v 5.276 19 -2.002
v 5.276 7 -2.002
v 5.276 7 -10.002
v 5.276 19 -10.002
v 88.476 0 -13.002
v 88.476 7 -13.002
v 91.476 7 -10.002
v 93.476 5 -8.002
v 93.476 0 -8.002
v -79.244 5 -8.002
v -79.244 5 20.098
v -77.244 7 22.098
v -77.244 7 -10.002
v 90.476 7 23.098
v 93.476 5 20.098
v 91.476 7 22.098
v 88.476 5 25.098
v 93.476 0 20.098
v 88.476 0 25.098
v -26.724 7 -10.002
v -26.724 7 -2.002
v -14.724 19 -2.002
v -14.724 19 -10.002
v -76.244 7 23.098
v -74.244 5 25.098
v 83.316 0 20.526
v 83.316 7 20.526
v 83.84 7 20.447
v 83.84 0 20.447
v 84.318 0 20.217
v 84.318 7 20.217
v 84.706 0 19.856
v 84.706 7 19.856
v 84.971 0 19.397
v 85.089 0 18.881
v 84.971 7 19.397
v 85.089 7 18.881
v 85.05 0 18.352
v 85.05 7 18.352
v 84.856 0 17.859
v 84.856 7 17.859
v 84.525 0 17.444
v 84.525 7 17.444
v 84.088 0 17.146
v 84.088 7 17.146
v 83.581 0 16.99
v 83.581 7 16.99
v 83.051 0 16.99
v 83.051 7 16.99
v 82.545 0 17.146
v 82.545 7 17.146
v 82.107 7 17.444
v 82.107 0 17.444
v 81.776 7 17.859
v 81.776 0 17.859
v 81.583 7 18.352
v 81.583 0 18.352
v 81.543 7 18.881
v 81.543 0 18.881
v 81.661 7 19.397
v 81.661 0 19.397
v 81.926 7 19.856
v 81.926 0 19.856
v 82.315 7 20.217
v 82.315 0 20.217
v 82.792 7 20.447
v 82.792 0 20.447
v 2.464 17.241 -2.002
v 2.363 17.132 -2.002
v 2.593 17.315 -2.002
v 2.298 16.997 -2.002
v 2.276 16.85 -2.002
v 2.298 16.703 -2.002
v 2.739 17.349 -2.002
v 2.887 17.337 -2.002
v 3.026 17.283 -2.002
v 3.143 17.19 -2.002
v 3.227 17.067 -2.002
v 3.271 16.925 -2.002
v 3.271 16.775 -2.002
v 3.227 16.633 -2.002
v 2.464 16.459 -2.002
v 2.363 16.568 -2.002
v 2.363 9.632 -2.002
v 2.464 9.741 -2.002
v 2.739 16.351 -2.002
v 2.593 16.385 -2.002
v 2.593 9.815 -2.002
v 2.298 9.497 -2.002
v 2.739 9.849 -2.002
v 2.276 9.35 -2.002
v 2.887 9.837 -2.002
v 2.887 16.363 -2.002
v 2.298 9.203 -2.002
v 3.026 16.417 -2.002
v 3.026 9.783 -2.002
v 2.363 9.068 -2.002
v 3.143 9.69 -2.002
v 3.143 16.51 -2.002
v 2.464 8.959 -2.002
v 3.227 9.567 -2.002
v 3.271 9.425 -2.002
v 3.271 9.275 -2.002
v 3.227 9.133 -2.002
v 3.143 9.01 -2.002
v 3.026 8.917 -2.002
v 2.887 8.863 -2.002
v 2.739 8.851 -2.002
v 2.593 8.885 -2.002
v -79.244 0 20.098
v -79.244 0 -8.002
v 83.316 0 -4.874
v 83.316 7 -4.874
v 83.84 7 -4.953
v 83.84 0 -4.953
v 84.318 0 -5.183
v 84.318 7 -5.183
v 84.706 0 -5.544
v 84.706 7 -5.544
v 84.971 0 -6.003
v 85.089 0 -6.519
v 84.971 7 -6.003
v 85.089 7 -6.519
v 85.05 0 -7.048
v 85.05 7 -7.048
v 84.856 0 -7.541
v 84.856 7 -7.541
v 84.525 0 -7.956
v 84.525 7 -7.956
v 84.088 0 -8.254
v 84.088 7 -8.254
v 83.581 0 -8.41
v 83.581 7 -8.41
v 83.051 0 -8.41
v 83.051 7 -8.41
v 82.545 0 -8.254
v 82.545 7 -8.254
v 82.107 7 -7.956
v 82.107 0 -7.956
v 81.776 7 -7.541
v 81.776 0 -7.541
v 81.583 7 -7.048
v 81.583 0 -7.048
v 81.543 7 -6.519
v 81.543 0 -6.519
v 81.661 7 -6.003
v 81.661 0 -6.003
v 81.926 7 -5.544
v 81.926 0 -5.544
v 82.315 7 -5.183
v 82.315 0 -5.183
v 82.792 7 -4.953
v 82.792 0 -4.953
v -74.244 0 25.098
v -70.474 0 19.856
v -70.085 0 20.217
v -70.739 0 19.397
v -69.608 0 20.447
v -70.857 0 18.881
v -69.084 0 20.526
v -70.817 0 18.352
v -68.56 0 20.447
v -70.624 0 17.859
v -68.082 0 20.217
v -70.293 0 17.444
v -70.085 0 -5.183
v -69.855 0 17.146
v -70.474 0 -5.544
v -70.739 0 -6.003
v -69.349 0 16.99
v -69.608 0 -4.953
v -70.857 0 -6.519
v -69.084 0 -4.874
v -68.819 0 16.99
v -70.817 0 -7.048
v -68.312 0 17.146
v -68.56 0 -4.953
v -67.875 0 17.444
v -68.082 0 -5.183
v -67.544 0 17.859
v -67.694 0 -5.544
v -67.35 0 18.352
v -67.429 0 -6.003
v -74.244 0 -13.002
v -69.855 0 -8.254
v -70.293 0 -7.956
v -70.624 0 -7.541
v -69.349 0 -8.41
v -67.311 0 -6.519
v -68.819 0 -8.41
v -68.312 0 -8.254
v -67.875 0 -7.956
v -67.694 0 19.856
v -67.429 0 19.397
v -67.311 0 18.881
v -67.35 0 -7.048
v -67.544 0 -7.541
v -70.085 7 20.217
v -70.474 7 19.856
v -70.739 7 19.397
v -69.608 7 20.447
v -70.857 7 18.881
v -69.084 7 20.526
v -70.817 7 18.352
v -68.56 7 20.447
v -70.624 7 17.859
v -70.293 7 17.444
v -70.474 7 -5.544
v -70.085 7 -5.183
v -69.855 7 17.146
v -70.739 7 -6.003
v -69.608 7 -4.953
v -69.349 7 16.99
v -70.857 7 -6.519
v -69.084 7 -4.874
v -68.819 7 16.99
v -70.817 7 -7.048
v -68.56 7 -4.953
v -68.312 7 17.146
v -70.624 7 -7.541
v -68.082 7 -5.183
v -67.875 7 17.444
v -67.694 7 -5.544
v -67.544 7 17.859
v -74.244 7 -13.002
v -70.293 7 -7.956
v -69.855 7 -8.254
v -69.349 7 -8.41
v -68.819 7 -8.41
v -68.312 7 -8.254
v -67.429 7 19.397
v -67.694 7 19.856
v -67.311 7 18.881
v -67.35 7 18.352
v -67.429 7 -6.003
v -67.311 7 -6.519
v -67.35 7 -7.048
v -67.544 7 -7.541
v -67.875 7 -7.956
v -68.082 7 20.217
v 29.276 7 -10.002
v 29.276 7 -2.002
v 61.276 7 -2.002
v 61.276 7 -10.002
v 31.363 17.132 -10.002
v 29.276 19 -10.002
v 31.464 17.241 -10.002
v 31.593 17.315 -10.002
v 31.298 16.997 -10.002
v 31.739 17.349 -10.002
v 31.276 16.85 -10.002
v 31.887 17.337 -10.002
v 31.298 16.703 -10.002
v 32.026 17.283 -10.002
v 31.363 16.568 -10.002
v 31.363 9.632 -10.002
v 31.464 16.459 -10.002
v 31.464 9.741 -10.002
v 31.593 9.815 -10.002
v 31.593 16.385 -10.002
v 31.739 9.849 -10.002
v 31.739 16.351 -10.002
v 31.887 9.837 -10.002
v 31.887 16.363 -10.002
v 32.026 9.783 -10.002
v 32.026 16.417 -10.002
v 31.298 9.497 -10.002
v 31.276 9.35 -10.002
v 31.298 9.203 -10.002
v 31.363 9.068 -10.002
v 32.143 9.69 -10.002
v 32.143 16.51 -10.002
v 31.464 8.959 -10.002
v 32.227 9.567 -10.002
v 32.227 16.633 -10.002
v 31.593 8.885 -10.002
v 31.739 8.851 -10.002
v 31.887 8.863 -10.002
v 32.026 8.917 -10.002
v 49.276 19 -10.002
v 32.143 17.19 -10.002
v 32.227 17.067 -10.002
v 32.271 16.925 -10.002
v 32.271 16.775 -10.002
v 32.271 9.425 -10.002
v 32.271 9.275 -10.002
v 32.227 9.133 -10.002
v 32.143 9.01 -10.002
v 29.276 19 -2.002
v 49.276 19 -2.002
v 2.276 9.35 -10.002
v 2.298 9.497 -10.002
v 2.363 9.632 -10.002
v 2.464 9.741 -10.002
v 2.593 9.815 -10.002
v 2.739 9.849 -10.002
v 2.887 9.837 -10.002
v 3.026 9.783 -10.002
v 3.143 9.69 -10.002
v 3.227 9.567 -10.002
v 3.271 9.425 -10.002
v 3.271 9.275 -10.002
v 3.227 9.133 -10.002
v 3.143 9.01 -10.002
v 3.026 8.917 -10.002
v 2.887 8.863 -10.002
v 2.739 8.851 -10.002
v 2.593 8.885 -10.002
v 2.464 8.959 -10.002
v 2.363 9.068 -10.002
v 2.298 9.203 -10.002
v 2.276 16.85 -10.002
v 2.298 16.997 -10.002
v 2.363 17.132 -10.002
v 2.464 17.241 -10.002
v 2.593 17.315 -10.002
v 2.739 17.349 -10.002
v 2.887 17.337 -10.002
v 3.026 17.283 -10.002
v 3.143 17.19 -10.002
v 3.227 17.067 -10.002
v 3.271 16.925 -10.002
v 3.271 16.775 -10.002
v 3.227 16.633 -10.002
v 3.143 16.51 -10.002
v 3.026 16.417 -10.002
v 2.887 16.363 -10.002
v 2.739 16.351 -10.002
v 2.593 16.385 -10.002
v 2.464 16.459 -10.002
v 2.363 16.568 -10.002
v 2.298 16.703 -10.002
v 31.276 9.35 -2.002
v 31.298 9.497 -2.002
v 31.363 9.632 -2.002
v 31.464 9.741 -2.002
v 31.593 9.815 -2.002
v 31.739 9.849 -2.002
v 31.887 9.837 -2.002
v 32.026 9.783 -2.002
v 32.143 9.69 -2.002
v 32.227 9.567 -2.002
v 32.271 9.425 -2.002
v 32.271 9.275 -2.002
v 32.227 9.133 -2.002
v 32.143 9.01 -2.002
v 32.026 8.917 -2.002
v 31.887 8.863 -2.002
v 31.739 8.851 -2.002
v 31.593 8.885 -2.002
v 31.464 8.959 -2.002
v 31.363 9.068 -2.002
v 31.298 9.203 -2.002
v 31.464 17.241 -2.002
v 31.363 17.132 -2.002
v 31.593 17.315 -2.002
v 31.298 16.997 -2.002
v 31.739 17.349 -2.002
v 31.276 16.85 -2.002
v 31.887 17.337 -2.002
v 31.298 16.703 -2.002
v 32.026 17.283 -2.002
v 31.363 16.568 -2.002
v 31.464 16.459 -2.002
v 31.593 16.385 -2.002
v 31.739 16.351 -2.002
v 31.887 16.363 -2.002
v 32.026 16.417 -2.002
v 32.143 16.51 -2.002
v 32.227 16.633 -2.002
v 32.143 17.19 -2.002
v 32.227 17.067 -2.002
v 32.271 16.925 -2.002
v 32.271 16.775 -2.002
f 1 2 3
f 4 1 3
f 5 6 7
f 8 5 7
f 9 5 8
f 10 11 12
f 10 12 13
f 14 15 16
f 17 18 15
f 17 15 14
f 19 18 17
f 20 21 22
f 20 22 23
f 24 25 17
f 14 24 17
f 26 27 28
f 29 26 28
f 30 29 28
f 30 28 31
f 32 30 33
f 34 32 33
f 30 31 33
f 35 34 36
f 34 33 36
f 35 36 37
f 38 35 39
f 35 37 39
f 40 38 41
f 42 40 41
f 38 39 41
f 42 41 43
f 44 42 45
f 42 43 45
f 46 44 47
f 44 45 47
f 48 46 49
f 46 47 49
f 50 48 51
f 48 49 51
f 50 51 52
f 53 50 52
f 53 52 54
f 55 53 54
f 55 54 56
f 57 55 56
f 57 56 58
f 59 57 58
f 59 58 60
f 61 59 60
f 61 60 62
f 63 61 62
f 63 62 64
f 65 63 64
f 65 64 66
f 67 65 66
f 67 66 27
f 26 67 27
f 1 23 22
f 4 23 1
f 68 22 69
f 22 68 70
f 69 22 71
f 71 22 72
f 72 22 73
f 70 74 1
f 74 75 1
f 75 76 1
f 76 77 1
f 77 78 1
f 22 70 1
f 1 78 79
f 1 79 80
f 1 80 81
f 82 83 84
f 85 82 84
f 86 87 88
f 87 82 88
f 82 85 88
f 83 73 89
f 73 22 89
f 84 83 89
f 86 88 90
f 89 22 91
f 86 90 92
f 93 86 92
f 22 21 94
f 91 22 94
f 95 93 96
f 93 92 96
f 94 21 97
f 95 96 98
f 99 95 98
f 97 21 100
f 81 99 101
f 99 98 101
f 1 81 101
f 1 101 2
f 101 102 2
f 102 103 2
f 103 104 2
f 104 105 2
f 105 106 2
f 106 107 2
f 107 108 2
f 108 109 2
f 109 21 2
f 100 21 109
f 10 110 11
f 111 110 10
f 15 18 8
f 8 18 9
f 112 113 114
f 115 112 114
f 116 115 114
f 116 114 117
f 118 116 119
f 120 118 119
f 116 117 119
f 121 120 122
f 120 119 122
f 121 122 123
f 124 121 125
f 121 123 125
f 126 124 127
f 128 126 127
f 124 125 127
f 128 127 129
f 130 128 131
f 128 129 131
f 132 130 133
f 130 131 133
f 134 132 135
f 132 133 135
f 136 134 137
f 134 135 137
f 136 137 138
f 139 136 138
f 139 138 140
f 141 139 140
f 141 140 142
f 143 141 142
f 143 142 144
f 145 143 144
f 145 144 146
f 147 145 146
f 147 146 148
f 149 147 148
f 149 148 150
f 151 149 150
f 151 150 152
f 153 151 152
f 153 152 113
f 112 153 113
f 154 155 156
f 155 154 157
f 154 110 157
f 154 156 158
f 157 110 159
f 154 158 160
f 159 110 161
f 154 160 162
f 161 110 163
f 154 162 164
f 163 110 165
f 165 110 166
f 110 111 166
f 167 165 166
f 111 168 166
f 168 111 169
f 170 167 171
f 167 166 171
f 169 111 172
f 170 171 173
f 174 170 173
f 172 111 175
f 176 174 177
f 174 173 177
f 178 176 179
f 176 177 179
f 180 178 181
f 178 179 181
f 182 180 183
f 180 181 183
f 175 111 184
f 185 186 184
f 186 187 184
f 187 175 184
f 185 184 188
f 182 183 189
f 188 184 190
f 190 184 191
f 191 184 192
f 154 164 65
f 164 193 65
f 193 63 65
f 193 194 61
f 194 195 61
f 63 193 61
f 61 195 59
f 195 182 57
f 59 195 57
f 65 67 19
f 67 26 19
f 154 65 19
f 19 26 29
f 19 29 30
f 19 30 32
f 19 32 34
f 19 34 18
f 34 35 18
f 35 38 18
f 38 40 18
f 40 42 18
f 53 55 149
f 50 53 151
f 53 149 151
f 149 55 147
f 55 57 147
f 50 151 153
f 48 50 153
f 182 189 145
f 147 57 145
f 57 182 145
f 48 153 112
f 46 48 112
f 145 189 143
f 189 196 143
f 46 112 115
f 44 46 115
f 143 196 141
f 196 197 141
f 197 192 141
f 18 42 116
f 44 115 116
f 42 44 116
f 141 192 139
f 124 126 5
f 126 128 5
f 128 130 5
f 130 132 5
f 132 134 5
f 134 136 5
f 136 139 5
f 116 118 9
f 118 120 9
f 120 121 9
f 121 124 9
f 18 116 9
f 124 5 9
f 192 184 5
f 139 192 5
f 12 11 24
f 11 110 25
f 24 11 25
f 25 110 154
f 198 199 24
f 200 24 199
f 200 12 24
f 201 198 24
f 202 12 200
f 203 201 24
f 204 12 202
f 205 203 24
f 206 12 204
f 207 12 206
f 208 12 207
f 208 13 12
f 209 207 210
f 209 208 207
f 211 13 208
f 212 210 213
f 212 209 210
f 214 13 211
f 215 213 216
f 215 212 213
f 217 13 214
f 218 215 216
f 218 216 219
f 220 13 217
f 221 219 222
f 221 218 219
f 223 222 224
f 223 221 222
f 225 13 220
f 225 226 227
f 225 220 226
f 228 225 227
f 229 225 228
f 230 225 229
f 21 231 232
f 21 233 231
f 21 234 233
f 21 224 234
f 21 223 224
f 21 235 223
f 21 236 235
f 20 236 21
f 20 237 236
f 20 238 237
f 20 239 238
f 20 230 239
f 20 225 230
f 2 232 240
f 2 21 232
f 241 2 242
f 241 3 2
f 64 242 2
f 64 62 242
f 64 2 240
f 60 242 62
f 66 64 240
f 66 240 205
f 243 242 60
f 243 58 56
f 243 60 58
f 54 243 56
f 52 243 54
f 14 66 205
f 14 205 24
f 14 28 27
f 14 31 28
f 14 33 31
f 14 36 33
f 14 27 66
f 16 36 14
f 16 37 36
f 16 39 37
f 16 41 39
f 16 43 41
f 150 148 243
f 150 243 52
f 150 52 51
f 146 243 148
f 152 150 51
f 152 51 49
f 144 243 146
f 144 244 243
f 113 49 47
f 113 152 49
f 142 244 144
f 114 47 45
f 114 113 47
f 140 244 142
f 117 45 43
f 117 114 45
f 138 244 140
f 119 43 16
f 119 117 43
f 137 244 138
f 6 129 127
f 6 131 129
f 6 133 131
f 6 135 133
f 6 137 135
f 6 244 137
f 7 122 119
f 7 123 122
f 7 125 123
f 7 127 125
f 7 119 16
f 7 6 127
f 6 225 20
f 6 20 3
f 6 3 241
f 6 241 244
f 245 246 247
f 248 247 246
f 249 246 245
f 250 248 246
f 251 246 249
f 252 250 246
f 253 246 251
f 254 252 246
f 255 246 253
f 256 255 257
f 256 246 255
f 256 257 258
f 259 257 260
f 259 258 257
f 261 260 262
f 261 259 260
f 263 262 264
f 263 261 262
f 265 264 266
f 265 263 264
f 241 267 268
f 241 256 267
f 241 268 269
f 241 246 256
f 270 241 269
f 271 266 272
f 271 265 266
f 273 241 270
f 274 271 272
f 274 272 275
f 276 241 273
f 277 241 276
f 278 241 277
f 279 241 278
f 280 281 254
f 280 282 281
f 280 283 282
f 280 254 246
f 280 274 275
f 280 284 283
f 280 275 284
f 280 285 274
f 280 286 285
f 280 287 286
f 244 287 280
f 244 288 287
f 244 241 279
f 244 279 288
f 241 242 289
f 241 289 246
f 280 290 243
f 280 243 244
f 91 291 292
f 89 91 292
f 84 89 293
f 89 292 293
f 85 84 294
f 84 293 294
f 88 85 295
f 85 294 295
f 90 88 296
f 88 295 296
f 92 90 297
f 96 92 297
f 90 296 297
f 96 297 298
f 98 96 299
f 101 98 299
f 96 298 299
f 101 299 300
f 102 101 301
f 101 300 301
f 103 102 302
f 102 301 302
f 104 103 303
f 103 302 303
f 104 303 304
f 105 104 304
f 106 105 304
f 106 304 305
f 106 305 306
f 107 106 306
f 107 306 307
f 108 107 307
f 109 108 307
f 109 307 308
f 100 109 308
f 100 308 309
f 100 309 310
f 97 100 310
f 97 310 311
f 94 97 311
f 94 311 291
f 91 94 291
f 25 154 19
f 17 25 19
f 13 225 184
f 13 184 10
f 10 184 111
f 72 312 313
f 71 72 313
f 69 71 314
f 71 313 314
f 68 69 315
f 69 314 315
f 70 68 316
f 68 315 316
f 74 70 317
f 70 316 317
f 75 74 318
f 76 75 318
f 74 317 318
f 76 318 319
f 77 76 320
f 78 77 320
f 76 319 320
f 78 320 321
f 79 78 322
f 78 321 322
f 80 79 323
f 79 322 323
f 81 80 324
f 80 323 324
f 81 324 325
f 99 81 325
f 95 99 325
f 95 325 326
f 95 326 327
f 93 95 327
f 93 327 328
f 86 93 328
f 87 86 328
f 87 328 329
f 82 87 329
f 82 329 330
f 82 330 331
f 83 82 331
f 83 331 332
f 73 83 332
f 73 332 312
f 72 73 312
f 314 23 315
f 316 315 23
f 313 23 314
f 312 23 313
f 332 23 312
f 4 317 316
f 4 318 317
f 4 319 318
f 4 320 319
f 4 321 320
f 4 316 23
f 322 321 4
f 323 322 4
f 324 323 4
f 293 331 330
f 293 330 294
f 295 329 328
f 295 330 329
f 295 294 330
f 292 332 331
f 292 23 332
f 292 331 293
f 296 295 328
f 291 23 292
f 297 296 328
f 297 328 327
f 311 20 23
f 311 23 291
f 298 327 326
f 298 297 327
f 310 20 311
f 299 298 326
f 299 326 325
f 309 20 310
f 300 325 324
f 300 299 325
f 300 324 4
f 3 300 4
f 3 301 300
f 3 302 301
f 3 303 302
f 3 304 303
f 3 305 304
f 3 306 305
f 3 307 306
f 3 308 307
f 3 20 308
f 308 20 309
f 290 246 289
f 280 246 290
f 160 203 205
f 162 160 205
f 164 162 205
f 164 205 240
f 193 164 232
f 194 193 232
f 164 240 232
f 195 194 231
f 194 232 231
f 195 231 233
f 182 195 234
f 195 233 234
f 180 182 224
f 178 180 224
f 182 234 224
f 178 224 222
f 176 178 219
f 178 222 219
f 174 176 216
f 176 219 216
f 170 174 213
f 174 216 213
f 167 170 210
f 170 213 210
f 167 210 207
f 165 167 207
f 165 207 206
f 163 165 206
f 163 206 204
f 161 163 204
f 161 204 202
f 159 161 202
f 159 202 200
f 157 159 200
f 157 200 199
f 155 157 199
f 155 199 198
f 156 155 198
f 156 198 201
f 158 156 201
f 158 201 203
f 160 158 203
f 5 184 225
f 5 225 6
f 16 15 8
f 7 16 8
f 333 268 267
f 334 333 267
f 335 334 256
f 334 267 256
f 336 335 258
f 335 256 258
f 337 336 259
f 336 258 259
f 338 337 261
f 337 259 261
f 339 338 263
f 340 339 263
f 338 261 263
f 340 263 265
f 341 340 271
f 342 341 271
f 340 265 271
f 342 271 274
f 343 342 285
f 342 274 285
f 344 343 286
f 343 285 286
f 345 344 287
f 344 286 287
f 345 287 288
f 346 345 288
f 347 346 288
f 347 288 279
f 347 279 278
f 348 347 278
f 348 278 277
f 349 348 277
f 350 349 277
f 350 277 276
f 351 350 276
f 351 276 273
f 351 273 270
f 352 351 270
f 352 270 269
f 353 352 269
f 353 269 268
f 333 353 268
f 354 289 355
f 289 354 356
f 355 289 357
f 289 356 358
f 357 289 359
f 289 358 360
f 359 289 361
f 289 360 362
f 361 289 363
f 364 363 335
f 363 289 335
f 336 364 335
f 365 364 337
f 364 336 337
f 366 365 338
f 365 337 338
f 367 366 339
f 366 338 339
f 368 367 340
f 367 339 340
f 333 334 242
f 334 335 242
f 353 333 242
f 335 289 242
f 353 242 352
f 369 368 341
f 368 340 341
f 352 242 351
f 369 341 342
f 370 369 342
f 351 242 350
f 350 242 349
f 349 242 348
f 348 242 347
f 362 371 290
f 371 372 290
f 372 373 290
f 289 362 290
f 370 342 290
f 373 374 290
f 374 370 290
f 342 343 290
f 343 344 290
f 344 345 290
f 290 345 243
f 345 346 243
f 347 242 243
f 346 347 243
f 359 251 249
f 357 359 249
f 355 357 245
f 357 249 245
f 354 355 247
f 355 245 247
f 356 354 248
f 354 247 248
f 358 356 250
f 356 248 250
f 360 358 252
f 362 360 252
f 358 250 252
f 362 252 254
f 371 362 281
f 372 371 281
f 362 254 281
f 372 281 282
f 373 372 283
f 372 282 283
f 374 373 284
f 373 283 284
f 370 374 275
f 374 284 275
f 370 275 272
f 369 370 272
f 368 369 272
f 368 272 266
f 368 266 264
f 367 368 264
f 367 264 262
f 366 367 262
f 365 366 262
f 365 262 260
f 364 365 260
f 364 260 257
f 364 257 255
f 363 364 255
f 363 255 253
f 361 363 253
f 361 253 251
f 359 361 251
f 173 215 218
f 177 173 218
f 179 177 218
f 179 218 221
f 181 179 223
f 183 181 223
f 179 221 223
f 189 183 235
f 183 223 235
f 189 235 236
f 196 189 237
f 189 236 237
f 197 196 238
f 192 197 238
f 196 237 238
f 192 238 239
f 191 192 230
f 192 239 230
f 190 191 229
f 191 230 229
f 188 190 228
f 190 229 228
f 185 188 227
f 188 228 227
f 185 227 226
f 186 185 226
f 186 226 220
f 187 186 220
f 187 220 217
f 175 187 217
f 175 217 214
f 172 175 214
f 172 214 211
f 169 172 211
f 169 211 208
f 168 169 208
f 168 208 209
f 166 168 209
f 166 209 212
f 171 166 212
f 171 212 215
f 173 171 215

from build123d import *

# Parameters (mm, degrees)
SKETCH1_W           = 172.72
SKETCH1_H           = 38.1
BOSS_EXTRUDE1_DEPTH = 7
SKETCH2_R           = 1.778
CUT_EXTRUDE1_DEPTH  = 17
SKETCH3_W           = 20
SKETCH3_H           = 8
BOSS_EXTRUDE2_DEPTH = 12
SKETCH4_R           = 0.5
CUT_EXTRUDE2_DEPTH  = 10
CHAMFER1_SIZE       = 12
CHAMFER2_SIZE       = 2
CHAMFER3_SIZE       = 5


# Some blends are built 0.0001 mm under size
with BuildPart() as part:
    # Sketch1 → Boss-Extrude1 (new body)
    with BuildSketch(Plane(origin=(0, 0, 0), x_dir=(1, 0, 0), z_dir=(0, 1, 0))):
        with Locations((7.116134283, -6.04768057)):
            Rectangle(SKETCH1_W, SKETCH1_H)
    extrude(amount=BOSS_EXTRUDE1_DEPTH)

    # Sketch2 → Cut-Extrude1 (cut)
    with BuildSketch(Plane(origin=(0, 7, 0), x_dir=(1, 0, 0), z_dir=(0, 1, 0))):
        with Locations(Location((-69.083865717, 6.65231943, 0), (0, 0, 270))):
            Circle(SKETCH2_R)
        with Locations(Location((-69.083865717, -18.74768057, 0), (0, 0, 270))):
            Circle(SKETCH2_R)
        with Locations(Location((83.316134283, 6.65231943, 0), (0, 0, 270))):
            Circle(SKETCH2_R)
        with Locations(Location((83.316134283, -18.74768057, 0), (0, 0, 270))):
            Circle(SKETCH2_R)
    extrude(amount=-CUT_EXTRUDE1_DEPTH, mode=Mode.SUBTRACT)

    # Sketch3 → Boss-Extrude2 (add)
    with BuildSketch(Plane(origin=(0, 7, 0), x_dir=(1, 0, 0), z_dir=(0, 1, 0))):
        with Locations((-4.723865717, 6.00231943)):
            Rectangle(SKETCH3_W, SKETCH3_H)
        with Locations((39.276134283, 6.00231943)):
            Rectangle(SKETCH3_W, SKETCH3_H)
    extrude(amount=BOSS_EXTRUDE2_DEPTH)

    # Sketch4 → Cut-Extrude2 (cut)
    with BuildSketch(Plane(origin=(0, 0, -10.00231943), x_dir=(-1, 0, 0), z_dir=(0, 0, -1))):
        with Locations((-31.776134283, 16.85)):
            Circle(SKETCH4_R)
        with Locations((-31.776134283, 9.35)):
            Circle(SKETCH4_R)
        with Locations((-2.776134283, 9.35)):
            Circle(SKETCH4_R)
        with Locations((-2.776134283, 16.85)):
            Circle(SKETCH4_R)
    extrude(amount=-CUT_EXTRUDE2_DEPTH, mode=Mode.SUBTRACT)

    # Chamfer1
    chamfer1_edges = [part.edges().sort_by_distance(p)[0] for p in [
        (49.276134283, 7, -6.00231943),
        (-14.723865717, 7, -6.00231943),
    ]]
    chamfer(chamfer1_edges, length=CHAMFER1_SIZE - 0.0001)  # a hair under: the kernel refuses the full size

    # Chamfer2
    chamfer2_edges = [part.edges().sort_by_distance(p)[0] for p in [
        (93.476134283, 7, 6.04768057),
        (-79.243865717, 7, 6.04768057),
        (7.116134283, 7, 25.09768057),
    ]]
    chamfer(chamfer2_edges, length=CHAMFER2_SIZE)

    # Chamfer3
    # the kernel refuses this chamfer: 5 mm, written as the material it takes off along each edge
    with BuildSketch(Plane(origin=(93.476134283, -12.85841494, -13.00231943), x_dir=(-0.9996219169112968, 0, -0.027495876610586282), z_dir=(0, 1, 0)), Plane(origin=(93.476134283, -12.85841494, 25.09768057), x_dir=(0.0274958766105877, 0, -0.9996219169112968), z_dir=(0, 1, 0))) as chamfer3_piece_1:
        Polygon((CHAMFER3_SIZE * 0.999621916911, CHAMFER3_SIZE * 0.0274958766106), (-CHAMFER3_SIZE * 0.0274958766106, CHAMFER3_SIZE * 0.999621916911), (0, 0), align=None)
    extrude(amount=30.71682988, mode=Mode.SUBTRACT)
    with BuildSketch(Plane(origin=(-79.243865717, -12.85841494, 25.09768057), x_dir=(-0.0274958766105877, 0, -0.9996219169112968), z_dir=(0, 1, 0)), Plane(origin=(-79.243865717, -12.85841494, -13.00231943), x_dir=(0.9996219169112968, 0, -0.027495876610586282), z_dir=(0, 1, 0))) as chamfer3_piece_2:
        Polygon((CHAMFER3_SIZE * 0.999621916911, -CHAMFER3_SIZE * 0.0274958766106), (-CHAMFER3_SIZE * 0.0274958766106, -CHAMFER3_SIZE * 0.999621916911), (0, 0), align=None)
    extrude(amount=30.71682988, mode=Mode.SUBTRACT)


solid = part.part
